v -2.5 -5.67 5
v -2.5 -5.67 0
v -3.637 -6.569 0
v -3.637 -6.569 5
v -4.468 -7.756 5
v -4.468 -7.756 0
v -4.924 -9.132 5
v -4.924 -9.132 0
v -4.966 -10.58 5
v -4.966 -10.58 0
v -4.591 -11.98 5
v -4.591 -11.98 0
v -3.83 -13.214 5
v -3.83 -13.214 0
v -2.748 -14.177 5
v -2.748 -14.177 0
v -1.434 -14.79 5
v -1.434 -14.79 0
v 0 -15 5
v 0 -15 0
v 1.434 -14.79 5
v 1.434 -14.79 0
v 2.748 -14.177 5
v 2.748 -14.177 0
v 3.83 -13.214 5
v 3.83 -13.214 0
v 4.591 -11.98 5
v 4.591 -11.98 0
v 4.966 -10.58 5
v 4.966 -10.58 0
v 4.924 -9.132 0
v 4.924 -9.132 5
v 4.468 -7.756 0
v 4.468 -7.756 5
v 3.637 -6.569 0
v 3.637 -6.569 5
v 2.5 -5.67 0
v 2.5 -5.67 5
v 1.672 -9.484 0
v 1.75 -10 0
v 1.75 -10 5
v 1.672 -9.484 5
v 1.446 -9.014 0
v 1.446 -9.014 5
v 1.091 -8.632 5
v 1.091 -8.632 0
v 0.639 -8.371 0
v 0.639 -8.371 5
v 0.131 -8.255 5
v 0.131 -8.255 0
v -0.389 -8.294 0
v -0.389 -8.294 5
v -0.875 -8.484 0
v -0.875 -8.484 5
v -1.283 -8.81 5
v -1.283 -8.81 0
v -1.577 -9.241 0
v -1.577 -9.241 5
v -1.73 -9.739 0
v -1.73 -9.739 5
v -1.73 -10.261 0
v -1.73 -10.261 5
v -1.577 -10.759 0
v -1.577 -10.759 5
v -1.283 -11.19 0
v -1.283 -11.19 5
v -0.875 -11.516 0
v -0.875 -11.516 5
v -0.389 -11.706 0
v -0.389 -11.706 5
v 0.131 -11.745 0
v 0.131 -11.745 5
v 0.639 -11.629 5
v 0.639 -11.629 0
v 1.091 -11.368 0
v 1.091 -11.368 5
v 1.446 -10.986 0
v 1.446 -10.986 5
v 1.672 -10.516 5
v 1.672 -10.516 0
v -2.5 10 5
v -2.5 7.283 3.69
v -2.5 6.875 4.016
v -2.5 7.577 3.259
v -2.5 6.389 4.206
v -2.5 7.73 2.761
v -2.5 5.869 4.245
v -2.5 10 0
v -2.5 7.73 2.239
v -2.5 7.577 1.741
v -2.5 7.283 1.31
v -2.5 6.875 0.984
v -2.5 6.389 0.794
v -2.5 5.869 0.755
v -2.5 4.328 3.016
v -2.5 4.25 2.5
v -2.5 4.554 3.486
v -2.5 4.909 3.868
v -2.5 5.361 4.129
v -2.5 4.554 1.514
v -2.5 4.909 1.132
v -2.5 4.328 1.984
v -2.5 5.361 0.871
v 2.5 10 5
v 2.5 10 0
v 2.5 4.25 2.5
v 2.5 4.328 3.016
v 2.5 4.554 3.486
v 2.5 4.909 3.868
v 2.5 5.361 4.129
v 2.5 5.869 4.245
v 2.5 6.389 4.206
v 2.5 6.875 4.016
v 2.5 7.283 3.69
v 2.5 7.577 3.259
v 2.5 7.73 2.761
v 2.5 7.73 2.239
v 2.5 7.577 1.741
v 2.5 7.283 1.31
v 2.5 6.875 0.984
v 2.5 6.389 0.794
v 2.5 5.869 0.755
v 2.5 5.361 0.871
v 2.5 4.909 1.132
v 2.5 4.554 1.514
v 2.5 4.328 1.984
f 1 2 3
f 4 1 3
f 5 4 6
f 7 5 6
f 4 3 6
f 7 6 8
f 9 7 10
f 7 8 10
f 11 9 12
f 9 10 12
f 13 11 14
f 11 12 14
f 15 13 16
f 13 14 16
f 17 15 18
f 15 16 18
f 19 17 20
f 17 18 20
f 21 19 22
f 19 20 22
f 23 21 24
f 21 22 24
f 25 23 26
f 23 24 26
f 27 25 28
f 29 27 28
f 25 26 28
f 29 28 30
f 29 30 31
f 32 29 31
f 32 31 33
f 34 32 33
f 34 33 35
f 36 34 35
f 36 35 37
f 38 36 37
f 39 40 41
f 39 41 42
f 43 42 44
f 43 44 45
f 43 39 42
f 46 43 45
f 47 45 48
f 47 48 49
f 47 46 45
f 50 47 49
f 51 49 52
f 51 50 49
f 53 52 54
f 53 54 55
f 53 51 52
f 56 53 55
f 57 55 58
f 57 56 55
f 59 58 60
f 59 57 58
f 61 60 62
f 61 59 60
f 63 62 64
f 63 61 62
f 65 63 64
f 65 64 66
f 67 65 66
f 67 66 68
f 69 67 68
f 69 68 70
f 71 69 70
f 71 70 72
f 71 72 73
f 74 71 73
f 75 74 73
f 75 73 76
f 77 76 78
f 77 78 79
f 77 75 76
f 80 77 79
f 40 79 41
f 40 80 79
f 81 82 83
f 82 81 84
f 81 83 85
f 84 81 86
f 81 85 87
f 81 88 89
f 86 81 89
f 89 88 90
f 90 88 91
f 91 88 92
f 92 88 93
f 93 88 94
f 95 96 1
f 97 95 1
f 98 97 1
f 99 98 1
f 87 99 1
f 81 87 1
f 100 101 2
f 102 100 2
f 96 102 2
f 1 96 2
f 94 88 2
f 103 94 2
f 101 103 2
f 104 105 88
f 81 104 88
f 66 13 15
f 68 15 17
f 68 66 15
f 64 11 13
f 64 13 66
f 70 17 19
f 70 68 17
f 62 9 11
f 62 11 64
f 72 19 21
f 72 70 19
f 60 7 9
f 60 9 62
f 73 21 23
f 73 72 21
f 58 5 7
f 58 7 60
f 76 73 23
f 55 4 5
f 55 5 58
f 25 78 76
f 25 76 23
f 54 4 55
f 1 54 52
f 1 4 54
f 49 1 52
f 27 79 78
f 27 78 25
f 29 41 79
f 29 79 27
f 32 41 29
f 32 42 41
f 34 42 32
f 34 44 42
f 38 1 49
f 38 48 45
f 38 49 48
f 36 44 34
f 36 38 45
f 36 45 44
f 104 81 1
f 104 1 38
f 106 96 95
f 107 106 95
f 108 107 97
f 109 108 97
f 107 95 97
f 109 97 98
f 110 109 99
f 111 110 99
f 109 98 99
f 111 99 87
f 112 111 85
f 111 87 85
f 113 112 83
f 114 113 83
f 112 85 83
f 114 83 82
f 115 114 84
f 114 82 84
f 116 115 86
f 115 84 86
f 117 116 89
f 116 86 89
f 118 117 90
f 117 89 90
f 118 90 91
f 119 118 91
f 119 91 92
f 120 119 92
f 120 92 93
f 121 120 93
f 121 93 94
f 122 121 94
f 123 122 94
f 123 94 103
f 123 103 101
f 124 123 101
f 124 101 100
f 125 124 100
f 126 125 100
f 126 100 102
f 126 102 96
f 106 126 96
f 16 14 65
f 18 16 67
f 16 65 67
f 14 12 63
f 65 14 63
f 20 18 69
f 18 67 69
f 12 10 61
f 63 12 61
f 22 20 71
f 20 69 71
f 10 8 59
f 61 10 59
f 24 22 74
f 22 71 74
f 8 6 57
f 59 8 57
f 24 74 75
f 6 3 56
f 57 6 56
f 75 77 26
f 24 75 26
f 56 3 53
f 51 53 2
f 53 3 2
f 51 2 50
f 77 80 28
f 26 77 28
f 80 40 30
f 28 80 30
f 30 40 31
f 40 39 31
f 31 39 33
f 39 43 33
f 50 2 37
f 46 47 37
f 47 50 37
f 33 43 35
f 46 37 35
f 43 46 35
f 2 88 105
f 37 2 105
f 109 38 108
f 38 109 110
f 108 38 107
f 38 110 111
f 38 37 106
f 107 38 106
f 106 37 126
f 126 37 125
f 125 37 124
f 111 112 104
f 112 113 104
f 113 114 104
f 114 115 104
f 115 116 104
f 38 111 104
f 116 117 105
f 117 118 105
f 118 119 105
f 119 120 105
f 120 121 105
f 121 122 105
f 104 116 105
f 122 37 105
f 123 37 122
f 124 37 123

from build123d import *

# Parameters (mm, degrees)
F0_R     = 1.75
F1_DEPTH = 5
F2_R     = 1.75
F3_DEPTH = 25


with BuildPart() as f1:
    # F0 (on Top) → F1 (new body)
    with BuildSketch(Plane.XY):
        with BuildLine():
            Line((2.5, -5.669873), (2.5, 10))
            Line((2.5, 10), (-2.5, 10))
            Line((-2.5, 10), (-2.5, -5.669873))
            ThreePointArc((-2.5, -5.669873), (0, -15), (2.5, -5.669873))
        make_face()
        with Locations((0, -10)):
            Circle(F0_R, mode=Mode.SUBTRACT)
    extrude(amount=F1_DEPTH)

    # F2 (on face) → F3 (cut)
    with BuildSketch(Plane(origin=(-2.5, 0, 0), x_dir=(0, -1, 0), z_dir=(-1, 0, 0))):
        with Locations((-6, 2.5)):
            Circle(F2_R)
    extrude(amount=-F3_DEPTH, mode=Mode.SUBTRACT)


solid = f1.part
